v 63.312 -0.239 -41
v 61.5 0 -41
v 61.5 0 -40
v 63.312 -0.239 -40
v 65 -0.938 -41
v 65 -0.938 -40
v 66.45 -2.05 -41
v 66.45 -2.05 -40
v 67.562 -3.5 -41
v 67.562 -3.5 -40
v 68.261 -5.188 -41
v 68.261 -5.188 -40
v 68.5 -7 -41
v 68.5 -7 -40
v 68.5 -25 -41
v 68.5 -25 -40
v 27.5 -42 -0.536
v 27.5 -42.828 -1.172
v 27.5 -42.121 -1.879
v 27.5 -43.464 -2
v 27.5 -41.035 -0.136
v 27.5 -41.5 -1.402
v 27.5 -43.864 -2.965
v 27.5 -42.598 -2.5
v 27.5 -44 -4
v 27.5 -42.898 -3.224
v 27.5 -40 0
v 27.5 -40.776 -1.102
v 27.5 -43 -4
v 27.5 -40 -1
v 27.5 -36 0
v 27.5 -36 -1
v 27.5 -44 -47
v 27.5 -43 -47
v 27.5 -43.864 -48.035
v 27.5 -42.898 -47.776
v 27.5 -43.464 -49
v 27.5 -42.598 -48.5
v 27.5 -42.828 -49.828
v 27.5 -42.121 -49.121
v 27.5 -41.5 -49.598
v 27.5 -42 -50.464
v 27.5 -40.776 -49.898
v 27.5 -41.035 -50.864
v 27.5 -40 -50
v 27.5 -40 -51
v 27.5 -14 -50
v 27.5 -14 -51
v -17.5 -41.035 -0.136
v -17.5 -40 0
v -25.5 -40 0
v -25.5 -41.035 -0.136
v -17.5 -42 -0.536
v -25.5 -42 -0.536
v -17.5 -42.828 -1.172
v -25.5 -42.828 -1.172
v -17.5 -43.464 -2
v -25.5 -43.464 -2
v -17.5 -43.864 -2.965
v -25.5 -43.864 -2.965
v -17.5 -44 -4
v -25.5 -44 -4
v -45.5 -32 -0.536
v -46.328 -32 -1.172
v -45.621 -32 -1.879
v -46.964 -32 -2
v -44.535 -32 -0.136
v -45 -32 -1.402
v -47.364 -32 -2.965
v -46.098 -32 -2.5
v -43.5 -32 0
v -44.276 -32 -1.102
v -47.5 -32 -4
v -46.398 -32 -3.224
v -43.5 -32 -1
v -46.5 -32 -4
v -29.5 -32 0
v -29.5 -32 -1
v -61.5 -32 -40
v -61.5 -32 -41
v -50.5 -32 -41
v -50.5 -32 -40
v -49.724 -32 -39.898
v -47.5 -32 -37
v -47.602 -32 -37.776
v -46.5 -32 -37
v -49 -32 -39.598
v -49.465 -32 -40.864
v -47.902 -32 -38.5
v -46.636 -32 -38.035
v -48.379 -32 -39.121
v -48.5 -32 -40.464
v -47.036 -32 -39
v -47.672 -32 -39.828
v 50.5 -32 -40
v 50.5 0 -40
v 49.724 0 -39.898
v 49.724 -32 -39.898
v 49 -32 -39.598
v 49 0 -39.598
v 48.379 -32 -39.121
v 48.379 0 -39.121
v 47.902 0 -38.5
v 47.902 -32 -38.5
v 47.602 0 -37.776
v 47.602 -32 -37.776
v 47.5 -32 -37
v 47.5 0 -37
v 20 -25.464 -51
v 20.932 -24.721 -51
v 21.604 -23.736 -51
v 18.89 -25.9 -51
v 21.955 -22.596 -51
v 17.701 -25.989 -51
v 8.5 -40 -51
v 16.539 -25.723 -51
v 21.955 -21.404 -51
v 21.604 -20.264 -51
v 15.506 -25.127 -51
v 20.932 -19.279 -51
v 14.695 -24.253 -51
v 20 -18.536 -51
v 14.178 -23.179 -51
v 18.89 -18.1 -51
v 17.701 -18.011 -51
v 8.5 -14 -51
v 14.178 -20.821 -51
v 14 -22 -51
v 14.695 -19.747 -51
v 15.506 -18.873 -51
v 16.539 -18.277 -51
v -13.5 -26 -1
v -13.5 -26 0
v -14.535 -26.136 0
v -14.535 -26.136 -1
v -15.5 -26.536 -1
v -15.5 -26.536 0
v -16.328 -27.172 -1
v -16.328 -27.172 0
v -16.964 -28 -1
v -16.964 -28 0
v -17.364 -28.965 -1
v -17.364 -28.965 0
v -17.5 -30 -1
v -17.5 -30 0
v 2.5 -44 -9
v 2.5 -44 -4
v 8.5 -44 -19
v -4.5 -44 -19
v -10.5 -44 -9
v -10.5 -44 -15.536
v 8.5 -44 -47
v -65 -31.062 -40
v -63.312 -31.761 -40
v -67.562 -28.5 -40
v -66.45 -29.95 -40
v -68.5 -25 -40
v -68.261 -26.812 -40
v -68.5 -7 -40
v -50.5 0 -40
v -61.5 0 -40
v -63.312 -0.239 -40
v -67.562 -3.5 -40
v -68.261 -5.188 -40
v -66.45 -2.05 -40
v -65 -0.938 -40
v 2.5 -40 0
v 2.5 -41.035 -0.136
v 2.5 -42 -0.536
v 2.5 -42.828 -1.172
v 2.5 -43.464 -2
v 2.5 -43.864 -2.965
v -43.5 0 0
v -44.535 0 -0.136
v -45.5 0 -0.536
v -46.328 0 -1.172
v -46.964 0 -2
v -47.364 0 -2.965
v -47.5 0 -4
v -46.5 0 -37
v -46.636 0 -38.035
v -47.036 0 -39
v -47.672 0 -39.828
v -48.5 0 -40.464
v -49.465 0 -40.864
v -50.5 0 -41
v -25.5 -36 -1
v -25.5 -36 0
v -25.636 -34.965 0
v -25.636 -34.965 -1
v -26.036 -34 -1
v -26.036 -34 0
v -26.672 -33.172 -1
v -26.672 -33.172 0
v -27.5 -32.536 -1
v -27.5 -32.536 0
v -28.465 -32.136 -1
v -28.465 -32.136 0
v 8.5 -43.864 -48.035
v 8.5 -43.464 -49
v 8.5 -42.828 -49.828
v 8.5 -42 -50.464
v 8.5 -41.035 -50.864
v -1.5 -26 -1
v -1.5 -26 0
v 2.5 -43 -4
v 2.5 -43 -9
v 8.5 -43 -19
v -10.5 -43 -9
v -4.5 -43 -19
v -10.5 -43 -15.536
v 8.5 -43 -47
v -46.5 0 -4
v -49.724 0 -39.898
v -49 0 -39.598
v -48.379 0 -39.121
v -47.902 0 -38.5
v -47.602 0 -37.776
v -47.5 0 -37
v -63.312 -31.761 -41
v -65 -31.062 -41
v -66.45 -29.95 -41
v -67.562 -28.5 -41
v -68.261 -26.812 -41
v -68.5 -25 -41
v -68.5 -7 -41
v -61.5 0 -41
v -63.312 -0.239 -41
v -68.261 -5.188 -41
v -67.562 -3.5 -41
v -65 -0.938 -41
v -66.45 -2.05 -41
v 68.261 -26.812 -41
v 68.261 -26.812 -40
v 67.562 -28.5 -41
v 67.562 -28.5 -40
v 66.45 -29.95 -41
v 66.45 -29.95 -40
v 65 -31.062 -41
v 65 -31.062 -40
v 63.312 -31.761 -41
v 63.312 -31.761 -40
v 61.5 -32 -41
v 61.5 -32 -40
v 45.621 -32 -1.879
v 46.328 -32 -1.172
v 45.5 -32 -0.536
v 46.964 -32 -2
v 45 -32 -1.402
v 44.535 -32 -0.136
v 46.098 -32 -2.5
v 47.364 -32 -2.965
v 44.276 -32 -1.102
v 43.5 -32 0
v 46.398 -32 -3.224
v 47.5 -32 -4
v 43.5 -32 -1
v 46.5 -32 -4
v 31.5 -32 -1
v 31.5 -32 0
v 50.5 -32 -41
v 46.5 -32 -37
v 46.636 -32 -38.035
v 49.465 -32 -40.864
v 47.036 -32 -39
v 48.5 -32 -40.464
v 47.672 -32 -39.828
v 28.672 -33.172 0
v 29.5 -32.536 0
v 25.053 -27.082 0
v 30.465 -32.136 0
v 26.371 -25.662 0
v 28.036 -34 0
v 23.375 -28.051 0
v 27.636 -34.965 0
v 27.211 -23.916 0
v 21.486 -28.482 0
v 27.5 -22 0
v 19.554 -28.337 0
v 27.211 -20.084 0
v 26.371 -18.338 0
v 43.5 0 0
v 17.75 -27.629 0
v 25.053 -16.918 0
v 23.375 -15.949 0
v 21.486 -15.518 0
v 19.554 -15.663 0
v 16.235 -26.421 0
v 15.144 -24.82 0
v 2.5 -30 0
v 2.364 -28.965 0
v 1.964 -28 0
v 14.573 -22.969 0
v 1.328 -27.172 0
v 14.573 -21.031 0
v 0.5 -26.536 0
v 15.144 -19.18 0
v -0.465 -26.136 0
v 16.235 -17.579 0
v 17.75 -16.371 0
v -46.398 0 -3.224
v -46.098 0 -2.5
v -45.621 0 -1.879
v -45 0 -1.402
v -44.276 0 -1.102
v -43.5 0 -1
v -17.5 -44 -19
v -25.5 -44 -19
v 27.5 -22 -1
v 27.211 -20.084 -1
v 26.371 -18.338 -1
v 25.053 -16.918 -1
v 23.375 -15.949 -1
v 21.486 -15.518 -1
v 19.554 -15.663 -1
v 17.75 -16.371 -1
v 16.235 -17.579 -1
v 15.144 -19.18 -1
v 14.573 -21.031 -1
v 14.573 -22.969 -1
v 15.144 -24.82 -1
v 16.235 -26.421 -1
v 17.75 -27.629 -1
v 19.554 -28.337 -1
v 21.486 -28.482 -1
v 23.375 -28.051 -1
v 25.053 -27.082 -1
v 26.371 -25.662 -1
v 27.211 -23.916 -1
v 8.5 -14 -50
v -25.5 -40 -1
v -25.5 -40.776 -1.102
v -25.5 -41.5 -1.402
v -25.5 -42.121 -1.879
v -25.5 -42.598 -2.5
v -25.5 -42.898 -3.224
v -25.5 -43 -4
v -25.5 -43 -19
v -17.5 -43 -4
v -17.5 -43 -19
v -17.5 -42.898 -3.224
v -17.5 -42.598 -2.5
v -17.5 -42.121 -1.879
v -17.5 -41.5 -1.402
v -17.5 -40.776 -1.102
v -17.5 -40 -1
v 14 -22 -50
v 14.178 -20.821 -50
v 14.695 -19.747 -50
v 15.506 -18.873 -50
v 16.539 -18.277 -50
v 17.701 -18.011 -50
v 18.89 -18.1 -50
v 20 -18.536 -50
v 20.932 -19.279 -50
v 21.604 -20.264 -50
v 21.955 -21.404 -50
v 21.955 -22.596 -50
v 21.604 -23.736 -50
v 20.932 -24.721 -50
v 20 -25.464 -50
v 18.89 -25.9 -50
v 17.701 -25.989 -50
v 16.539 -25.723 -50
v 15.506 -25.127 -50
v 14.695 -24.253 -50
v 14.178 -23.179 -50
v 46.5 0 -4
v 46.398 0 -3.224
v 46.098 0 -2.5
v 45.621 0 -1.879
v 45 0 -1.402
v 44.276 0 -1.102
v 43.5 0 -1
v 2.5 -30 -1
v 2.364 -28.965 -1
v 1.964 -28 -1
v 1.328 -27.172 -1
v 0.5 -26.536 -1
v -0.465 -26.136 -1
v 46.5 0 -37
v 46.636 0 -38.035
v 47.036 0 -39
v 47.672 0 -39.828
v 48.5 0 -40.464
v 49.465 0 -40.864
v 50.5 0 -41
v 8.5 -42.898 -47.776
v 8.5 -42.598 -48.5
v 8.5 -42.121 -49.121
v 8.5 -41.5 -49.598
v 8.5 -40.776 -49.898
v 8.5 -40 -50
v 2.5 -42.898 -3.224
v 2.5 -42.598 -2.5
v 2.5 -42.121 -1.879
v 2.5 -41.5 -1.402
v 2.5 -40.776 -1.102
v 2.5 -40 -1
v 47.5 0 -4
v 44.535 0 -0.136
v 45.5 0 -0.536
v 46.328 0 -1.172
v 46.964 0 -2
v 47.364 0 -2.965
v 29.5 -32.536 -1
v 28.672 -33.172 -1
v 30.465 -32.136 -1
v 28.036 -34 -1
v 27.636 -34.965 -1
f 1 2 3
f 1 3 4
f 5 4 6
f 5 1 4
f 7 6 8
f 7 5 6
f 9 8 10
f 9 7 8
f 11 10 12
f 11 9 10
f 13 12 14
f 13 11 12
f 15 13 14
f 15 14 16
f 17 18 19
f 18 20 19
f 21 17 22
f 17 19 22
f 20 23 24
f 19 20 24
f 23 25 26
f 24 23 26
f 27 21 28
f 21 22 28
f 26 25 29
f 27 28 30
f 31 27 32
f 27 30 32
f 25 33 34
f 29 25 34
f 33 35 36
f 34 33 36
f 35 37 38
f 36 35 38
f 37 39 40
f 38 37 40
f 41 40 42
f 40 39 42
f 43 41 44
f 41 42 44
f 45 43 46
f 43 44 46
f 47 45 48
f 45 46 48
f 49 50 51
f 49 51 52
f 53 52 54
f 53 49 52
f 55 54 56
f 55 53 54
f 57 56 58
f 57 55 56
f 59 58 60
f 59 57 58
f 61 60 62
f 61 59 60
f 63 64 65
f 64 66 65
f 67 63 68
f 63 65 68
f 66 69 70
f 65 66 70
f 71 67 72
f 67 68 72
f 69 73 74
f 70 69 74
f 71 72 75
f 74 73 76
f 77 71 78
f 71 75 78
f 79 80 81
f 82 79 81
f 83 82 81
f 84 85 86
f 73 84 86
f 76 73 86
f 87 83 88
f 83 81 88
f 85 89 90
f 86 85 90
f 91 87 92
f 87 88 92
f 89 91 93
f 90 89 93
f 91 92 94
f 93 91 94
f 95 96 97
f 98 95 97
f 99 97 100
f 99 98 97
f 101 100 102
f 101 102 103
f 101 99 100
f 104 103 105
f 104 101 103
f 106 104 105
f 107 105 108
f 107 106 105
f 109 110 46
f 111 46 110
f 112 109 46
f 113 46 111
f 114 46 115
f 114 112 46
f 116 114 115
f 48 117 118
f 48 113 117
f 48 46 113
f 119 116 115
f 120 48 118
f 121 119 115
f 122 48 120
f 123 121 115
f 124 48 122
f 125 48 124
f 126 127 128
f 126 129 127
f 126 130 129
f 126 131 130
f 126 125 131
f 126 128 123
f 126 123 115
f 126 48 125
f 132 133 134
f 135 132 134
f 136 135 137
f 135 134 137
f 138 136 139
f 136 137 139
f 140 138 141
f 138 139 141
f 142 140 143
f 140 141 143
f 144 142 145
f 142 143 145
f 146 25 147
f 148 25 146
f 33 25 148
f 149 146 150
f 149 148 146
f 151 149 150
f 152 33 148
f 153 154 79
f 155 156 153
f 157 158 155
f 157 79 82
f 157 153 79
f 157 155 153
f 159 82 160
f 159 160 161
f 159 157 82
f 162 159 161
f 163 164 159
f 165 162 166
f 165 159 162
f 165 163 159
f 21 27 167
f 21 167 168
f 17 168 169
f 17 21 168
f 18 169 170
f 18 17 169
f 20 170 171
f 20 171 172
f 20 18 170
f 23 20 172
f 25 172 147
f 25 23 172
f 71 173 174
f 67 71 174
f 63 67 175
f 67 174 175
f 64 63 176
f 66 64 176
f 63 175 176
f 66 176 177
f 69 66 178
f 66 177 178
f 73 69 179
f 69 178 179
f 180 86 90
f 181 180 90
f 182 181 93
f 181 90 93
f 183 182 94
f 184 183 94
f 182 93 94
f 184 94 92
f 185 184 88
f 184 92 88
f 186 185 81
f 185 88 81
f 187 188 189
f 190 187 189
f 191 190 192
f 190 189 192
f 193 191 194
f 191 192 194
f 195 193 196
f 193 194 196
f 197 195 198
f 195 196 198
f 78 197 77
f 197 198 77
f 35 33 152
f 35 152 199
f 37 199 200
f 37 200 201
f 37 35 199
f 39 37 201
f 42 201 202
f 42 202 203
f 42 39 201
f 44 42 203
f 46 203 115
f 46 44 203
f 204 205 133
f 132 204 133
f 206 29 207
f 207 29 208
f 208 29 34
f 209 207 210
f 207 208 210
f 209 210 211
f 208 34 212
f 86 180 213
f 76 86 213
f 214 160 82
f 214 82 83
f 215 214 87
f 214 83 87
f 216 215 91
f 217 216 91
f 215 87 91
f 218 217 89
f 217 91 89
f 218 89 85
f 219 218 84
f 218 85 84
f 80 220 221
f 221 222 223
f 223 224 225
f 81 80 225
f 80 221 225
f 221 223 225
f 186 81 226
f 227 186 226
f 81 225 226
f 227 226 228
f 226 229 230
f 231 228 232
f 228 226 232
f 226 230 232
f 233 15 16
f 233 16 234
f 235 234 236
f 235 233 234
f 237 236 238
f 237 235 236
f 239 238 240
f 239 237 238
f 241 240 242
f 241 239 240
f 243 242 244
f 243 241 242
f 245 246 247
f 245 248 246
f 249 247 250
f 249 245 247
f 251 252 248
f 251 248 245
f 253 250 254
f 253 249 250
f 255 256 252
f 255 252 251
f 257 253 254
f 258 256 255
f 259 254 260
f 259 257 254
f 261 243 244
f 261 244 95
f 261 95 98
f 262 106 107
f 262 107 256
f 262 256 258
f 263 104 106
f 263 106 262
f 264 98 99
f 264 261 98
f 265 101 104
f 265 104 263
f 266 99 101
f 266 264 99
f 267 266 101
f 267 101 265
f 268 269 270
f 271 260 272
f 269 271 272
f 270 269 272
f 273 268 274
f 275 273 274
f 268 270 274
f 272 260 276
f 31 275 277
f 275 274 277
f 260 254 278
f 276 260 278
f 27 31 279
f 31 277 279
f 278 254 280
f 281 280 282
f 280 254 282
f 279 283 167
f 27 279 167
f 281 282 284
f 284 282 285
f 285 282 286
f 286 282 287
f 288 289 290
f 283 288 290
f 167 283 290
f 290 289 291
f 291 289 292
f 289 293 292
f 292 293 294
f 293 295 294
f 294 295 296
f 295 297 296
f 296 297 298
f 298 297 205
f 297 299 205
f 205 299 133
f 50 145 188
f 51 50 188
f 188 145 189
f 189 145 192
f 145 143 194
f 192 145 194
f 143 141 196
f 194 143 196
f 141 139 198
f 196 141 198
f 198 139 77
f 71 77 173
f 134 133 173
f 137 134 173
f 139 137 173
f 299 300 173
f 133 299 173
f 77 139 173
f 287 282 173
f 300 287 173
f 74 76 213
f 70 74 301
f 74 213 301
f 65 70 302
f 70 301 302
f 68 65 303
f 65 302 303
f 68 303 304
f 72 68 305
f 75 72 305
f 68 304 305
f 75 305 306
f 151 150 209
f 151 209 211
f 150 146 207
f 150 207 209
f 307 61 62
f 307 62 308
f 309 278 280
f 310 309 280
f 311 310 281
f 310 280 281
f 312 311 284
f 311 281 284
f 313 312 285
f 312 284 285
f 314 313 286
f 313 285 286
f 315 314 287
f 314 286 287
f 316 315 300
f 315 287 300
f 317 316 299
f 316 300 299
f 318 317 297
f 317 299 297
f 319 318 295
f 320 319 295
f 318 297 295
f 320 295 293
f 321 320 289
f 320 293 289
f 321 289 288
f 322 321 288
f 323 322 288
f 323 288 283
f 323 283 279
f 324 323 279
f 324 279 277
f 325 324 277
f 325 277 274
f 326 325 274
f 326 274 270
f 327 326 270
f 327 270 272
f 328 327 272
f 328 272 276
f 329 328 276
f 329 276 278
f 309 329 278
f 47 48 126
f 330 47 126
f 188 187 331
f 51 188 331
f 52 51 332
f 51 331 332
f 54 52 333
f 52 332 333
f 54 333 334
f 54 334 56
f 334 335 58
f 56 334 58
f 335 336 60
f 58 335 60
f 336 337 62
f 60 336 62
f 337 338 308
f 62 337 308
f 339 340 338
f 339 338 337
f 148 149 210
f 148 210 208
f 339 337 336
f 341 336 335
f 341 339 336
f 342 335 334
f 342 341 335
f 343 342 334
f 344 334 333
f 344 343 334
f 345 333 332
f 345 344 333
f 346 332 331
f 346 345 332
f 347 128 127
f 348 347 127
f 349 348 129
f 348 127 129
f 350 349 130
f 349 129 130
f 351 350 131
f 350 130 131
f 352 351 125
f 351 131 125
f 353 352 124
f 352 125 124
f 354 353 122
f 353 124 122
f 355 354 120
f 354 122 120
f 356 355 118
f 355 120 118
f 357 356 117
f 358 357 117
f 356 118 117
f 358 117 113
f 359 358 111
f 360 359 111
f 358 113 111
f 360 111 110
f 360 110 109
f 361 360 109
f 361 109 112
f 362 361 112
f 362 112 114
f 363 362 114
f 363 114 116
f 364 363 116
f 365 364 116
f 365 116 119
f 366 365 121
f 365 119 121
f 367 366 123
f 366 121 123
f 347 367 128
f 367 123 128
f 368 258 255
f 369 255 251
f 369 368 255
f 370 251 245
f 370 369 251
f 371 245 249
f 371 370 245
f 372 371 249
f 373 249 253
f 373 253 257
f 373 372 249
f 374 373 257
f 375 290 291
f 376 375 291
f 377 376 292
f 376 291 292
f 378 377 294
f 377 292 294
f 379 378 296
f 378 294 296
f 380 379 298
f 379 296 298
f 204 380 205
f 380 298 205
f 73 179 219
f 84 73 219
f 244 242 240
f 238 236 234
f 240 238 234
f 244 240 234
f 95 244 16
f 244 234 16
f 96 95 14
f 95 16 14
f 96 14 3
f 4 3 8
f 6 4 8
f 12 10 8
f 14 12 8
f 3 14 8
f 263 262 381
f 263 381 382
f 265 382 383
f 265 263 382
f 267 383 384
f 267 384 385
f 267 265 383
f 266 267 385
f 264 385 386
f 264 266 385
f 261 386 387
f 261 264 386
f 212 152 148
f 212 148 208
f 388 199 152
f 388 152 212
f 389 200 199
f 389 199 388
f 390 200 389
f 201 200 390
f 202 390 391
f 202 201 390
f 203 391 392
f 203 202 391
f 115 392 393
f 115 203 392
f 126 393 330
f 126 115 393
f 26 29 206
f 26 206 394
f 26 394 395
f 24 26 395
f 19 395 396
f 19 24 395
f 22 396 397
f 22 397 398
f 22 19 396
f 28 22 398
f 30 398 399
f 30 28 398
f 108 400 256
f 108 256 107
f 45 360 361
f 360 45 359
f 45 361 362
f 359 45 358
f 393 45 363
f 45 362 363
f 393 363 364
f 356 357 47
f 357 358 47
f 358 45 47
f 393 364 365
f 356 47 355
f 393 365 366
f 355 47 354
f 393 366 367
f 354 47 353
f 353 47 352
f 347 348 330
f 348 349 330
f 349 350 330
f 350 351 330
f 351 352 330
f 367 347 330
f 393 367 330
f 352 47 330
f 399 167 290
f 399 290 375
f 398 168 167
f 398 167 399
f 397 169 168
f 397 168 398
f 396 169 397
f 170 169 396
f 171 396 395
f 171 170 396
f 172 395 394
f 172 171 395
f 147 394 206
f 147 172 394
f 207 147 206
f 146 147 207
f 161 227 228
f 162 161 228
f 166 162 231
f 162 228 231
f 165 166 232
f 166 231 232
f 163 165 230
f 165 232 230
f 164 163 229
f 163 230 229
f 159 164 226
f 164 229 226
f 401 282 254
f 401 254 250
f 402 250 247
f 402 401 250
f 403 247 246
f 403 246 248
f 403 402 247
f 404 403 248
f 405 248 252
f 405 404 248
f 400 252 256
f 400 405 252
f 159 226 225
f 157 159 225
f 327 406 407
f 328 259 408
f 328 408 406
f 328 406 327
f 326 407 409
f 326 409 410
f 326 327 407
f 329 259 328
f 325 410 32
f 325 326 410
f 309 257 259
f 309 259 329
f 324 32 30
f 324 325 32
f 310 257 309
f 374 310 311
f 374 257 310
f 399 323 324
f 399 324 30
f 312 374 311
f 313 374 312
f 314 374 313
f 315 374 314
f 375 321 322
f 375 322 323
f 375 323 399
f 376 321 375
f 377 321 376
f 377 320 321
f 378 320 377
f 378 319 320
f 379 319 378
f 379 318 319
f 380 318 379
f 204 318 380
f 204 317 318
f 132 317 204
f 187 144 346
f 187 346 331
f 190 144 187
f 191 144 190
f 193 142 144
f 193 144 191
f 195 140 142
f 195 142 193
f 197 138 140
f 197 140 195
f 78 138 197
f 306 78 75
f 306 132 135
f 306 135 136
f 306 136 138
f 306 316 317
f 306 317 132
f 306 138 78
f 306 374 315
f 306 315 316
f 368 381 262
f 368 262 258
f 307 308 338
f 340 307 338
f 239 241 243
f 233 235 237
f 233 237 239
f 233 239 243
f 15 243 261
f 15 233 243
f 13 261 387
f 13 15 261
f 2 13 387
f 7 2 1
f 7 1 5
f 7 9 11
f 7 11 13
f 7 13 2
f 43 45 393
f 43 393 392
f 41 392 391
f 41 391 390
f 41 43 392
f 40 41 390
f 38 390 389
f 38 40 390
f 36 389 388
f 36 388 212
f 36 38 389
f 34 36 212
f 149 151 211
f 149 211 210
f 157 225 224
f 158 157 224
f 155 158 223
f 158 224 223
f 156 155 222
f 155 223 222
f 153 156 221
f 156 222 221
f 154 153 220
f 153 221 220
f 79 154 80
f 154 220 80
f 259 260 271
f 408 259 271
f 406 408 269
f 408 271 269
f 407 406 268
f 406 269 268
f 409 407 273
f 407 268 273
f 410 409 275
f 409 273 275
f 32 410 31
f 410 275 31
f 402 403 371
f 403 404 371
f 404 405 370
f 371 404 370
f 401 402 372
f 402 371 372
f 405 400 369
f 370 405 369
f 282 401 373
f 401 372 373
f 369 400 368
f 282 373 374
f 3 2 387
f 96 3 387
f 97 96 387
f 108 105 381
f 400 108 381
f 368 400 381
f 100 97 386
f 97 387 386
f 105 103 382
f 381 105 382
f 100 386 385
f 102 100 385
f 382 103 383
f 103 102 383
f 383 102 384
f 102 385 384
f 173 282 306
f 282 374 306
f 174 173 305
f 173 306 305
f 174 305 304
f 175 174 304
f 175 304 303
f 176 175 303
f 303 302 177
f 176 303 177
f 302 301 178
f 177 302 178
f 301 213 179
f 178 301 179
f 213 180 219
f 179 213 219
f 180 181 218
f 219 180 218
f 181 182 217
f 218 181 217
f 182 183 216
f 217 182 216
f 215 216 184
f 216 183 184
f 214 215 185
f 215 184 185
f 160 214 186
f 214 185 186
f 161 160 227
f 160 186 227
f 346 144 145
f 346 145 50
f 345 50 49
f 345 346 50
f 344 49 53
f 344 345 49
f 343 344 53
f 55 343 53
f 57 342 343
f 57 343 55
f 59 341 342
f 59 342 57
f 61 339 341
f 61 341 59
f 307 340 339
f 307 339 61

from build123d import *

# Parameters (mm, degrees)
BASE_FLANGE1_DEPTH           = 1
SKETCH6_R                    = 6.5
CUT_EXTRUDE1_DEPTH           = 10
EDGE_FLANGE1_STRIP_W         = 10
EDGE_FLANGE1_STRIP_H         = 1
EDGE_FLANGE1_STRIP_CUT_DEPTH = 32
EDGE_FLANGE1_DEPTH           = 32
EDGE_FLANGE2_STRIP_W         = 10
EDGE_FLANGE2_STRIP_H         = 1
EDGE_FLANGE2_STRIP_CUT_DEPTH = 32
EDGE_FLANGE2_DEPTH           = 32
EDGE_FLANGE2_FLAT_DEPTH      = 1
EDGE_FLANGE3_STRIP_W         = 10
EDGE_FLANGE3_STRIP_H         = 1
EDGE_FLANGE3_STRIP_CUT_DEPTH = 8
EDGE_FLANGE3_DEPTH           = 8
EDGE_FLANGE4_STRIP_W         = 10
EDGE_FLANGE4_STRIP_H         = 1
EDGE_FLANGE4_STRIP_CUT_DEPTH = 25
EDGE_FLANGE4_DEPTH           = 25
EDGE_FLANGE4_FLAT_DEPTH      = 1
EDGE_FLANGE5_STRIP_W         = 10
EDGE_FLANGE5_STRIP_H         = 1
EDGE_FLANGE5_STRIP_CUT_DEPTH = 19
EDGE_FLANGE5_DEPTH           = 19
EDGE_FLANGE5_PROFILE_W       = 19
EDGE_FLANGE5_PROFILE_H       = 26
EDGE_FLANGE5_PROFILE_R       = 4
EDGE_FLANGE5_FLAT_DEPTH      = 1


# Sheet-metal steps are written as plain solids
with BuildPart() as part:
    # Sketch1 → Base-Flange1 (new body)
    with BuildSketch(Plane.XY):
        with BuildLine():
            Line((-47.5, 0), (47.5, 0))
            Line((47.5, 0), (47.5, -32))
            Line((47.5, -32), (31.5, -32))
            ThreePointArc((31.5, -32), (28.671572875, -33.171572875), (27.5, -36))
            Line((27.5, -36), (27.5, -44))
            Line((27.5, -44), (2.5, -44))
            Line((2.5, -44), (2.5, -30))
            ThreePointArc((2.5, -30), (1.328427125, -27.171572875), (-1.5, -26))
            Line((-1.5, -26), (-13.5, -26))
            ThreePointArc((-13.5, -26), (-16.328427125, -27.171572875), (-17.5, -30))
            Line((-17.5, -30), (-17.5, -44))
            Line((-17.5, -44), (-25.5, -44))
            Line((-25.5, -44), (-25.5, -36))
            ThreePointArc((-25.5, -36), (-26.671572875, -33.171572875), (-29.5, -32))
            Line((-29.5, -32), (-47.5, -32))
            Line((-47.5, -32), (-47.5, 0))
        make_face()
    extrude(amount=-BASE_FLANGE1_DEPTH)

    # Sketch6 → Cut-Extrude1 (cut)
    with BuildSketch(Plane.XY):
        with Locations((21, -22)):
            Circle(SKETCH6_R)
    extrude(amount=-CUT_EXTRUDE1_DEPTH, mode=Mode.SUBTRACT)

    # Edge-Flange1 strip (across the edge) → Edge-Flange1 strip cut (cut)
    with BuildSketch(Plane(origin=(47.5, 0, -1), x_dir=(-1, 0, 0), z_dir=(0, -1, 0))):
        with Locations((-1, -0.5)):
            Rectangle(EDGE_FLANGE1_STRIP_W, EDGE_FLANGE1_STRIP_H)
    edge_flange1_strip_cut = extrude(amount=EDGE_FLANGE1_STRIP_CUT_DEPTH, mode=Mode.SUBTRACT)

    # Edge-Flange1 section (across the edge) → Edge-Flange1 (add)
    with BuildSketch(Plane(origin=(47.5, 0, -1), x_dir=(-1, 0, 0), z_dir=(0, -1, 0))):
        with BuildLine():
            Line((0, 3), (0, 40))
            Line((0, 40), (1, 40))
            Line((1, 40), (1, 3))
            ThreePointArc((1, 3), (1.878679656, 0.878679656), (4, 0))
            Line((4, 0), (4, -1))
            ThreePointArc((4, -1), (1.171572875, 0.171572875), (0, 3))
        make_face()
    edge_flange1 = extrude(amount=EDGE_FLANGE1_DEPTH)

    # Edge-Flange2 strip (across the edge) → Edge-Flange2 strip cut (cut)
    with BuildSketch(Plane(origin=(47.5, -32, -41), x_dir=(0, 0, 1), z_dir=(0, 1, 0))):
        with Locations((-1, -0.5)):
            Rectangle(EDGE_FLANGE2_STRIP_W, EDGE_FLANGE2_STRIP_H)
    edge_flange2_strip_cut = extrude(amount=EDGE_FLANGE2_STRIP_CUT_DEPTH, mode=Mode.SUBTRACT)

    # Edge-Flange2 bend section (across the edge) → Edge-Flange2 (add)
    with BuildSketch(Plane(origin=(47.5, -32, -41), x_dir=(0, 0, 1), z_dir=(0, 1, 0))):
        with BuildLine():
            Line((0, 3), (1, 3))
            ThreePointArc((1, 3), (1.878679656, 0.878679656), (4, 0))
            Line((4, 0), (4, -1))
            ThreePointArc((4, -1), (1.171572875, 0.171572875), (0, 3))
        make_face()
    edge_flange2 = extrude(amount=EDGE_FLANGE2_DEPTH)

    # Edge-Flange2 profile (on flange) → Edge-Flange2 flat (add)
    with BuildSketch(Plane(origin=(47.5, 0, -41), x_dir=(0, 1, 0), z_dir=(0, 0, -1))):
        with BuildLine():
            Line((-32, 3), (0, 3))
            Line((0, 3), (0, 14))
            ThreePointArc((0, 14), (-2.050252532, 18.949747468), (-7, 21))
            Line((-7, 21), (-25, 21))
            ThreePointArc((-25, 21), (-29.949747468, 18.949747468), (-32, 14))
            Line((-32, 14), (-32, 3))
        make_face()
    edge_flange2_flat = extrude(amount=-EDGE_FLANGE2_FLAT_DEPTH)

    # Mirror1: Edge-Flange1 strip cut, Edge-Flange1, Edge-Flange2 strip cut, Edge-Flange2, Edge-Flange2 flat across plane
    add(edge_flange1_strip_cut.mirror(Plane(origin=(0, 0, 0), x_dir=(0, 0, 1), z_dir=(1, 0, 0))), mode=Mode.SUBTRACT)
    add(edge_flange1.mirror(Plane(origin=(0, 0, 0), x_dir=(0, 0, 1), z_dir=(1, 0, 0))))
    add(edge_flange2_strip_cut.mirror(Plane(origin=(0, 0, 0), x_dir=(0, 0, 1), z_dir=(1, 0, 0))), mode=Mode.SUBTRACT)
    add(edge_flange2.mirror(Plane(origin=(0, 0, 0), x_dir=(0, 0, 1), z_dir=(1, 0, 0))))
    add(edge_flange2_flat.mirror(Plane(origin=(0, 0, 0), x_dir=(0, 0, 1), z_dir=(1, 0, 0))))

    # Edge-Flange3 strip (across the edge) → Edge-Flange3 strip cut (cut)
    with BuildSketch(Plane(origin=(-17.5, -44, -1), x_dir=(0, 1, 0), z_dir=(-1, 0, 0))):
        with Locations((-1, -0.5)):
            Rectangle(EDGE_FLANGE3_STRIP_W, EDGE_FLANGE3_STRIP_H)
    extrude(amount=EDGE_FLANGE3_STRIP_CUT_DEPTH, mode=Mode.SUBTRACT)

    # Edge-Flange3 section (across the edge) → Edge-Flange3 (add)
    with BuildSketch(Plane(origin=(-17.5, -44, -1), x_dir=(0, 1, 0), z_dir=(-1, 0, 0))):
        with BuildLine():
            Line((0, 3), (0, 18))
            Line((0, 18), (1, 18))
            Line((1, 18), (1, 3))
            ThreePointArc((1, 3), (1.878679656, 0.878679656), (4, 0))
            Line((4, 0), (4, -1))
            ThreePointArc((4, -1), (1.171572875, 0.171572875), (0, 3))
        make_face()
    extrude(amount=EDGE_FLANGE3_DEPTH)

    # Edge-Flange4 strip (across the edge) → Edge-Flange4 strip cut (cut)
    with BuildSketch(Plane(origin=(27.5, -44, -1), x_dir=(0, 1, 0), z_dir=(-1, 0, 0))):
        with Locations((-1, -0.5)):
            Rectangle(EDGE_FLANGE4_STRIP_W, EDGE_FLANGE4_STRIP_H)
    extrude(amount=EDGE_FLANGE4_STRIP_CUT_DEPTH, mode=Mode.SUBTRACT)

    # Edge-Flange4 bend section (across the edge) → Edge-Flange4 (add)
    with BuildSketch(Plane(origin=(27.5, -44, -1), x_dir=(0, 1, 0), z_dir=(-1, 0, 0))):
        with BuildLine():
            Line((0, 3), (1, 3))
            ThreePointArc((1, 3), (1.878679656, 0.878679656), (4, 0))
            Line((4, 0), (4, -1))
            ThreePointArc((4, -1), (1.171572875, 0.171572875), (0, 3))
        make_face()
    extrude(amount=EDGE_FLANGE4_DEPTH)

    # Edge-Flange4 profile (on flange) → Edge-Flange4 flat (add)
    with BuildSketch(Plane(origin=(0, -44, -1), x_dir=(-1, 0, 0), z_dir=(0, -1, 0))):
        Polygon((-27.5, 3), (-2.5, 3), (-2.5, 8), (10.5, 8), (10.5, 14.535898385), (4.5, 18), (-2.5, 18), (-8.5, 18), (-8.5, 50), (-27.5, 50), align=None)
    extrude(amount=-EDGE_FLANGE4_FLAT_DEPTH)

    # Edge-Flange5 strip (across the edge) → Edge-Flange5 strip cut (cut)
    with BuildSketch(Plane(origin=(27.5, -43, -51), x_dir=(0, 0, 1), z_dir=(-1, 0, 0))):
        with Locations((-1, -0.5)):
            Rectangle(EDGE_FLANGE5_STRIP_W, EDGE_FLANGE5_STRIP_H)
    extrude(amount=EDGE_FLANGE5_STRIP_CUT_DEPTH, mode=Mode.SUBTRACT)

    # Edge-Flange5 bend section (across the edge) → Edge-Flange5 (add)
    with BuildSketch(Plane(origin=(27.5, -43, -51), x_dir=(0, 0, 1), z_dir=(-1, 0, 0))):
        with BuildLine():
            Line((0, 3), (1, 3))
            ThreePointArc((1, 3), (1.878679656, 0.878679656), (4, 0))
            Line((4, 0), (4, -1))
            ThreePointArc((4, -1), (1.171572875, 0.171572875), (0, 3))
        make_face()
    extrude(amount=EDGE_FLANGE5_DEPTH)

    # Edge-Flange5 profile (on flange) → Edge-Flange5 flat (add)
    with BuildSketch(Plane(origin=(0, -43, -51), x_dir=(-1, 0, 0), z_dir=(0, 0, -1))):
        with Locations((-18, 16)):
            Rectangle(EDGE_FLANGE5_PROFILE_W, EDGE_FLANGE5_PROFILE_H)
        with Locations((-18, 21)):
            Circle(EDGE_FLANGE5_PROFILE_R, mode=Mode.SUBTRACT)
    extrude(amount=-EDGE_FLANGE5_FLAT_DEPTH)


solid = part.part
